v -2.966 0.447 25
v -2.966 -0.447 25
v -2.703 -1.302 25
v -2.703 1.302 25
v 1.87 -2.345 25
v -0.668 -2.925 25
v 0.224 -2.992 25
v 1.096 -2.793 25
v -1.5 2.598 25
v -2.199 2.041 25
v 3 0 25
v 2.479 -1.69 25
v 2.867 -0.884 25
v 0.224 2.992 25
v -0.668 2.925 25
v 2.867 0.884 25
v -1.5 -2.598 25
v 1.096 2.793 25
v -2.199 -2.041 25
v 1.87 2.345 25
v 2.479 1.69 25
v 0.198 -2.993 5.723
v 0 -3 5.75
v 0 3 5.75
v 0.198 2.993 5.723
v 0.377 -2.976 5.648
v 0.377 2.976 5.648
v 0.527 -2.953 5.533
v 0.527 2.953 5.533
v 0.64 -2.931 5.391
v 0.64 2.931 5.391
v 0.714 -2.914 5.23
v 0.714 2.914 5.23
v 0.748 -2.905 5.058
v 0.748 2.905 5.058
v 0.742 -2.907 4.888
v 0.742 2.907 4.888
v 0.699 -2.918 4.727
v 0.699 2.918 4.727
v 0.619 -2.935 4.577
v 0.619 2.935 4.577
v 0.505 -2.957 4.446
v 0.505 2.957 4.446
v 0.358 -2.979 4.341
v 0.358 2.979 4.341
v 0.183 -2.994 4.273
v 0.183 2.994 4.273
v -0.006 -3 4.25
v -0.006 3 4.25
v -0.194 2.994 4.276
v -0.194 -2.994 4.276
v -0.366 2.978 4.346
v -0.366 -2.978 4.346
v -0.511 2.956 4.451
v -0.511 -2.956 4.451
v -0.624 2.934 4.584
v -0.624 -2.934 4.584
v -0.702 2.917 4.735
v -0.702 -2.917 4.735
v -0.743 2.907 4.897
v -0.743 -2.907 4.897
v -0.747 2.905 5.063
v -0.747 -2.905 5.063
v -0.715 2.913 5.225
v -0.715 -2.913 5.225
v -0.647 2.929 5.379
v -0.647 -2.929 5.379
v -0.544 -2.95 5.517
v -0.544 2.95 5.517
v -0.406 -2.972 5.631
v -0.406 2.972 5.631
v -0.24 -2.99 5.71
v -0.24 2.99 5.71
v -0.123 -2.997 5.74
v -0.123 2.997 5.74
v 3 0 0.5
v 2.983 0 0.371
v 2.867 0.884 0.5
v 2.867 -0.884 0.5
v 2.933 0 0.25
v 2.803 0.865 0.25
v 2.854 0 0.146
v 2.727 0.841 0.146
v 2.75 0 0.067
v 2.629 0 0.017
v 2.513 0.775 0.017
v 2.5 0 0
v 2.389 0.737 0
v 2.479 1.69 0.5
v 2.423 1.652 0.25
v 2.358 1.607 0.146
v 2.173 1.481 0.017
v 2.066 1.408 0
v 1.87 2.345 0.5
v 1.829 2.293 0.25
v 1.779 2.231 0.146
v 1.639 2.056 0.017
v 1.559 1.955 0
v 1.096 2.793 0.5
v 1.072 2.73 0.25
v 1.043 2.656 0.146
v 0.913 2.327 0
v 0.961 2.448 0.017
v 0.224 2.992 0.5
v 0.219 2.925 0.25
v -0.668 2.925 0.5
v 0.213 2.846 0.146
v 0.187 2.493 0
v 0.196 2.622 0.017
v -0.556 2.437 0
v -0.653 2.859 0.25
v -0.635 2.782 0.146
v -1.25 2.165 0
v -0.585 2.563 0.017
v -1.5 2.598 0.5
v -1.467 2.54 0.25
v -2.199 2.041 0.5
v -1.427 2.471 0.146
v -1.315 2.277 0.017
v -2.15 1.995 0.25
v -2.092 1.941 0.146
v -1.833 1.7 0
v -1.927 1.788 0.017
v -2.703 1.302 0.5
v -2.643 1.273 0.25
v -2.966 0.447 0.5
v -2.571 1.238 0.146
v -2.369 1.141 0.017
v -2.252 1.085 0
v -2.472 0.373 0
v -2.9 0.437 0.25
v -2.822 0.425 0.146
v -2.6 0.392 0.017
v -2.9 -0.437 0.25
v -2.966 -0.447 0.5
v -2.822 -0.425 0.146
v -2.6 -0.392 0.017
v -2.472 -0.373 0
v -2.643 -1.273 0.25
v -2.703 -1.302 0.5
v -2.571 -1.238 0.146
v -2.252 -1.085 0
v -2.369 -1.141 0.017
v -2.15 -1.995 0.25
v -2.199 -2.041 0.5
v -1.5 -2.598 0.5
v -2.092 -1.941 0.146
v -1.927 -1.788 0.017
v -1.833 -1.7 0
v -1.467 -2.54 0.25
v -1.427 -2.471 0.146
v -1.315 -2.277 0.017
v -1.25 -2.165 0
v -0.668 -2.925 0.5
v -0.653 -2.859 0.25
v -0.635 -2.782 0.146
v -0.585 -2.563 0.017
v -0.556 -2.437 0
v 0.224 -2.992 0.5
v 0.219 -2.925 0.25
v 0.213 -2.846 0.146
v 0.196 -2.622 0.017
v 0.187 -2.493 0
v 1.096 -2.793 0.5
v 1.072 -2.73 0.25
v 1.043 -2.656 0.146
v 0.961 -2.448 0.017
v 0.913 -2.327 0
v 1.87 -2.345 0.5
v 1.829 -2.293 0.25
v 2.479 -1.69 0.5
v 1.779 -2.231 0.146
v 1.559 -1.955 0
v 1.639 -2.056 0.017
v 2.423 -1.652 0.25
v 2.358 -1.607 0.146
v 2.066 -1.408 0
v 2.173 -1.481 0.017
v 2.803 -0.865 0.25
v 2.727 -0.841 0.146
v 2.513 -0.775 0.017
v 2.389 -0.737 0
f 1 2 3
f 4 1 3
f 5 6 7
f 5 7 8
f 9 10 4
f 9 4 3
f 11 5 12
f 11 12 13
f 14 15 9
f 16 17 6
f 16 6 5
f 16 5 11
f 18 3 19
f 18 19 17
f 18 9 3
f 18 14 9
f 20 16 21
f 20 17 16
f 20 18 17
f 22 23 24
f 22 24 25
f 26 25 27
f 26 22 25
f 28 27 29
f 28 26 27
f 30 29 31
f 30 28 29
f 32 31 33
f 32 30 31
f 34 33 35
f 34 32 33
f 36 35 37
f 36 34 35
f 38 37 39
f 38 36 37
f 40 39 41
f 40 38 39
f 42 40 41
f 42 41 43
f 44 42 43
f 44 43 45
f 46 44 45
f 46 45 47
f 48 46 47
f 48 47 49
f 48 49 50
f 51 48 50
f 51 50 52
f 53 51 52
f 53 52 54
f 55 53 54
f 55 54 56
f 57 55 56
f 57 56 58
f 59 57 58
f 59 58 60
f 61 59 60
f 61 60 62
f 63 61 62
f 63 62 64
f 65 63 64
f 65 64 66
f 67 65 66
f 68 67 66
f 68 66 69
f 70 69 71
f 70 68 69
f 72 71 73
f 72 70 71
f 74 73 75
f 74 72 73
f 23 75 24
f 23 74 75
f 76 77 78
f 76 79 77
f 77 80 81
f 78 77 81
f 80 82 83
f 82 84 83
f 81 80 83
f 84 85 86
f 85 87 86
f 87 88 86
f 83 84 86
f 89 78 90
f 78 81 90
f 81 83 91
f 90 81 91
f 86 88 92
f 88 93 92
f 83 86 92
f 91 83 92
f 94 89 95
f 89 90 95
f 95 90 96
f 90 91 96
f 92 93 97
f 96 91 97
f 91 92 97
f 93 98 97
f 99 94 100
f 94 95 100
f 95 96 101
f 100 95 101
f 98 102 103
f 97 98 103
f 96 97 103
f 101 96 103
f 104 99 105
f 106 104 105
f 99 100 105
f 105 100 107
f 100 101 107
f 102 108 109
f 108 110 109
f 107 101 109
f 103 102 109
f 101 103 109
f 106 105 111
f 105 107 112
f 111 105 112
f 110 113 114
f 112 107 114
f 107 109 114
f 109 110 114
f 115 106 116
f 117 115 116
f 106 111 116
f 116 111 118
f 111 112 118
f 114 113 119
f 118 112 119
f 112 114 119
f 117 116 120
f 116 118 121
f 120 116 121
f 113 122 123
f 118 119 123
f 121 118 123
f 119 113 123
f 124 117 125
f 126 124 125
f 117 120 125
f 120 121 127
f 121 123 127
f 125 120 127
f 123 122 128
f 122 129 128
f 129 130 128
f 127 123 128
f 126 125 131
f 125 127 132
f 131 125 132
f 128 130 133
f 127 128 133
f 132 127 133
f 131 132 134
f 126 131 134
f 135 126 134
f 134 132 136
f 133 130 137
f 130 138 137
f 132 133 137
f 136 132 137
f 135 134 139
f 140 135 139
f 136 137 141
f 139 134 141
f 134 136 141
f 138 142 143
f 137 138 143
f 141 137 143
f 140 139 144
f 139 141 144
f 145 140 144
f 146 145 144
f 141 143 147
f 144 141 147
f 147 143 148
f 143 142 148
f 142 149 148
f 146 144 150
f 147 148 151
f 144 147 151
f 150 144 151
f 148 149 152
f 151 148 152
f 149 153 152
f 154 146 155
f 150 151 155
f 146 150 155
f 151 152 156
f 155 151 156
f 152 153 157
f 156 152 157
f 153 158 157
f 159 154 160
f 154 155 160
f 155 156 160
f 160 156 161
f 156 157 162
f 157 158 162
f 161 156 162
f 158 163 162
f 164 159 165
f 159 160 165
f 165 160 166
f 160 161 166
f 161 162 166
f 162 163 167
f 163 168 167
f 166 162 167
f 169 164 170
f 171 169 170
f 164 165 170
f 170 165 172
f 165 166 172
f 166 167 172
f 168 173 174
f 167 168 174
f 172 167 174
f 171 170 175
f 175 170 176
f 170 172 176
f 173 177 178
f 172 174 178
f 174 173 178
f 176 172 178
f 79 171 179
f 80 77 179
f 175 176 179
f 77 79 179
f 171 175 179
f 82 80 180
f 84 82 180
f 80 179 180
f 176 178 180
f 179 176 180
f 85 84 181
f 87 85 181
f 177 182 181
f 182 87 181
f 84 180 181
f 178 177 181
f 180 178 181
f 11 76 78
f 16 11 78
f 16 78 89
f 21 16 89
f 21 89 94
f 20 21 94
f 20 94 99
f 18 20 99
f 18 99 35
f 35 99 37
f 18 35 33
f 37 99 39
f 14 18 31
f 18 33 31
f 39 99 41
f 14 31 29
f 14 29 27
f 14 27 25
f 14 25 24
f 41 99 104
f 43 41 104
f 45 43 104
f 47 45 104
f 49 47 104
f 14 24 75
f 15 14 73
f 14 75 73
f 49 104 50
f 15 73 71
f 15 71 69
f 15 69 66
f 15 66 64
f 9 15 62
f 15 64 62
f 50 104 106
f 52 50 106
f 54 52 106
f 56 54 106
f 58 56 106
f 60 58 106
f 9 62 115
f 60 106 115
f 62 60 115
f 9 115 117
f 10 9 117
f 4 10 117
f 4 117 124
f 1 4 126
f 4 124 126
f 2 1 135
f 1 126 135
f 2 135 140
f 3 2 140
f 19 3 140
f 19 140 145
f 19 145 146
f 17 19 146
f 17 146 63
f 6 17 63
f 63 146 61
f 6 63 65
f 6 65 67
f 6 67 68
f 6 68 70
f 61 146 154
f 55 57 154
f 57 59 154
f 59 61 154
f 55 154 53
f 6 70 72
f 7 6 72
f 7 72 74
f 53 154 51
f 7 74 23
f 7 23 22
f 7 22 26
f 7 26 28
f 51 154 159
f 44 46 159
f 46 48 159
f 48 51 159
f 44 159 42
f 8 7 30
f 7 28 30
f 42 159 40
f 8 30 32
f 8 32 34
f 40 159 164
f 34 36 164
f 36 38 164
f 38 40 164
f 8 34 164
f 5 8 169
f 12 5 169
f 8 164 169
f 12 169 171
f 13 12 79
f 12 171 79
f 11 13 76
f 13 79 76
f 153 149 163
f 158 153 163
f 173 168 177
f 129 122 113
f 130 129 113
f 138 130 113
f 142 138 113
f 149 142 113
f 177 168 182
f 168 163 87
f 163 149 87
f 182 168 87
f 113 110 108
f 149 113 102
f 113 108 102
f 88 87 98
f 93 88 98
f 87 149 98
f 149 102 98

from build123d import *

# Parameters (mm, degrees)
SKETCH2_R               = 3
BOSS_EXTRUDE1_DEPTH     = 25
CUT_EXTRUDE1_DEPTH      = 26.357444666
CUT_EXTRUDE1_DEPTH_BACK = 26.357444666
SKETCH3_R               = 0.75
FILLET1_R               = 0.5


with BuildPart() as part:
    # Sketch2 → Boss-Extrude1 (new body)
    with BuildSketch(Plane.XY):
        Circle(SKETCH2_R)
    extrude(amount=BOSS_EXTRUDE1_DEPTH)

    # Sketch3 → Cut-Extrude1 (cut, two sides: drawn at the far end of the back side and taken through both)
    with BuildSketch(Plane(origin=(0, 0, 0), x_dir=(1, 0, 0), z_dir=(0, 1, 0)).offset(-CUT_EXTRUDE1_DEPTH_BACK)):
        with Locations(Location((0, -5, 0), (0, 0, 270))):
            Circle(SKETCH3_R)
    extrude(amount=CUT_EXTRUDE1_DEPTH + CUT_EXTRUDE1_DEPTH_BACK, mode=Mode.SUBTRACT)

    # Fillet1
    fillet1_edges = [part.edges().sort_by_distance(p)[0] for p in [
        (-3, 0, 0),
    ]]
    fillet(fillet1_edges, radius=FILLET1_R)


solid = part.part
